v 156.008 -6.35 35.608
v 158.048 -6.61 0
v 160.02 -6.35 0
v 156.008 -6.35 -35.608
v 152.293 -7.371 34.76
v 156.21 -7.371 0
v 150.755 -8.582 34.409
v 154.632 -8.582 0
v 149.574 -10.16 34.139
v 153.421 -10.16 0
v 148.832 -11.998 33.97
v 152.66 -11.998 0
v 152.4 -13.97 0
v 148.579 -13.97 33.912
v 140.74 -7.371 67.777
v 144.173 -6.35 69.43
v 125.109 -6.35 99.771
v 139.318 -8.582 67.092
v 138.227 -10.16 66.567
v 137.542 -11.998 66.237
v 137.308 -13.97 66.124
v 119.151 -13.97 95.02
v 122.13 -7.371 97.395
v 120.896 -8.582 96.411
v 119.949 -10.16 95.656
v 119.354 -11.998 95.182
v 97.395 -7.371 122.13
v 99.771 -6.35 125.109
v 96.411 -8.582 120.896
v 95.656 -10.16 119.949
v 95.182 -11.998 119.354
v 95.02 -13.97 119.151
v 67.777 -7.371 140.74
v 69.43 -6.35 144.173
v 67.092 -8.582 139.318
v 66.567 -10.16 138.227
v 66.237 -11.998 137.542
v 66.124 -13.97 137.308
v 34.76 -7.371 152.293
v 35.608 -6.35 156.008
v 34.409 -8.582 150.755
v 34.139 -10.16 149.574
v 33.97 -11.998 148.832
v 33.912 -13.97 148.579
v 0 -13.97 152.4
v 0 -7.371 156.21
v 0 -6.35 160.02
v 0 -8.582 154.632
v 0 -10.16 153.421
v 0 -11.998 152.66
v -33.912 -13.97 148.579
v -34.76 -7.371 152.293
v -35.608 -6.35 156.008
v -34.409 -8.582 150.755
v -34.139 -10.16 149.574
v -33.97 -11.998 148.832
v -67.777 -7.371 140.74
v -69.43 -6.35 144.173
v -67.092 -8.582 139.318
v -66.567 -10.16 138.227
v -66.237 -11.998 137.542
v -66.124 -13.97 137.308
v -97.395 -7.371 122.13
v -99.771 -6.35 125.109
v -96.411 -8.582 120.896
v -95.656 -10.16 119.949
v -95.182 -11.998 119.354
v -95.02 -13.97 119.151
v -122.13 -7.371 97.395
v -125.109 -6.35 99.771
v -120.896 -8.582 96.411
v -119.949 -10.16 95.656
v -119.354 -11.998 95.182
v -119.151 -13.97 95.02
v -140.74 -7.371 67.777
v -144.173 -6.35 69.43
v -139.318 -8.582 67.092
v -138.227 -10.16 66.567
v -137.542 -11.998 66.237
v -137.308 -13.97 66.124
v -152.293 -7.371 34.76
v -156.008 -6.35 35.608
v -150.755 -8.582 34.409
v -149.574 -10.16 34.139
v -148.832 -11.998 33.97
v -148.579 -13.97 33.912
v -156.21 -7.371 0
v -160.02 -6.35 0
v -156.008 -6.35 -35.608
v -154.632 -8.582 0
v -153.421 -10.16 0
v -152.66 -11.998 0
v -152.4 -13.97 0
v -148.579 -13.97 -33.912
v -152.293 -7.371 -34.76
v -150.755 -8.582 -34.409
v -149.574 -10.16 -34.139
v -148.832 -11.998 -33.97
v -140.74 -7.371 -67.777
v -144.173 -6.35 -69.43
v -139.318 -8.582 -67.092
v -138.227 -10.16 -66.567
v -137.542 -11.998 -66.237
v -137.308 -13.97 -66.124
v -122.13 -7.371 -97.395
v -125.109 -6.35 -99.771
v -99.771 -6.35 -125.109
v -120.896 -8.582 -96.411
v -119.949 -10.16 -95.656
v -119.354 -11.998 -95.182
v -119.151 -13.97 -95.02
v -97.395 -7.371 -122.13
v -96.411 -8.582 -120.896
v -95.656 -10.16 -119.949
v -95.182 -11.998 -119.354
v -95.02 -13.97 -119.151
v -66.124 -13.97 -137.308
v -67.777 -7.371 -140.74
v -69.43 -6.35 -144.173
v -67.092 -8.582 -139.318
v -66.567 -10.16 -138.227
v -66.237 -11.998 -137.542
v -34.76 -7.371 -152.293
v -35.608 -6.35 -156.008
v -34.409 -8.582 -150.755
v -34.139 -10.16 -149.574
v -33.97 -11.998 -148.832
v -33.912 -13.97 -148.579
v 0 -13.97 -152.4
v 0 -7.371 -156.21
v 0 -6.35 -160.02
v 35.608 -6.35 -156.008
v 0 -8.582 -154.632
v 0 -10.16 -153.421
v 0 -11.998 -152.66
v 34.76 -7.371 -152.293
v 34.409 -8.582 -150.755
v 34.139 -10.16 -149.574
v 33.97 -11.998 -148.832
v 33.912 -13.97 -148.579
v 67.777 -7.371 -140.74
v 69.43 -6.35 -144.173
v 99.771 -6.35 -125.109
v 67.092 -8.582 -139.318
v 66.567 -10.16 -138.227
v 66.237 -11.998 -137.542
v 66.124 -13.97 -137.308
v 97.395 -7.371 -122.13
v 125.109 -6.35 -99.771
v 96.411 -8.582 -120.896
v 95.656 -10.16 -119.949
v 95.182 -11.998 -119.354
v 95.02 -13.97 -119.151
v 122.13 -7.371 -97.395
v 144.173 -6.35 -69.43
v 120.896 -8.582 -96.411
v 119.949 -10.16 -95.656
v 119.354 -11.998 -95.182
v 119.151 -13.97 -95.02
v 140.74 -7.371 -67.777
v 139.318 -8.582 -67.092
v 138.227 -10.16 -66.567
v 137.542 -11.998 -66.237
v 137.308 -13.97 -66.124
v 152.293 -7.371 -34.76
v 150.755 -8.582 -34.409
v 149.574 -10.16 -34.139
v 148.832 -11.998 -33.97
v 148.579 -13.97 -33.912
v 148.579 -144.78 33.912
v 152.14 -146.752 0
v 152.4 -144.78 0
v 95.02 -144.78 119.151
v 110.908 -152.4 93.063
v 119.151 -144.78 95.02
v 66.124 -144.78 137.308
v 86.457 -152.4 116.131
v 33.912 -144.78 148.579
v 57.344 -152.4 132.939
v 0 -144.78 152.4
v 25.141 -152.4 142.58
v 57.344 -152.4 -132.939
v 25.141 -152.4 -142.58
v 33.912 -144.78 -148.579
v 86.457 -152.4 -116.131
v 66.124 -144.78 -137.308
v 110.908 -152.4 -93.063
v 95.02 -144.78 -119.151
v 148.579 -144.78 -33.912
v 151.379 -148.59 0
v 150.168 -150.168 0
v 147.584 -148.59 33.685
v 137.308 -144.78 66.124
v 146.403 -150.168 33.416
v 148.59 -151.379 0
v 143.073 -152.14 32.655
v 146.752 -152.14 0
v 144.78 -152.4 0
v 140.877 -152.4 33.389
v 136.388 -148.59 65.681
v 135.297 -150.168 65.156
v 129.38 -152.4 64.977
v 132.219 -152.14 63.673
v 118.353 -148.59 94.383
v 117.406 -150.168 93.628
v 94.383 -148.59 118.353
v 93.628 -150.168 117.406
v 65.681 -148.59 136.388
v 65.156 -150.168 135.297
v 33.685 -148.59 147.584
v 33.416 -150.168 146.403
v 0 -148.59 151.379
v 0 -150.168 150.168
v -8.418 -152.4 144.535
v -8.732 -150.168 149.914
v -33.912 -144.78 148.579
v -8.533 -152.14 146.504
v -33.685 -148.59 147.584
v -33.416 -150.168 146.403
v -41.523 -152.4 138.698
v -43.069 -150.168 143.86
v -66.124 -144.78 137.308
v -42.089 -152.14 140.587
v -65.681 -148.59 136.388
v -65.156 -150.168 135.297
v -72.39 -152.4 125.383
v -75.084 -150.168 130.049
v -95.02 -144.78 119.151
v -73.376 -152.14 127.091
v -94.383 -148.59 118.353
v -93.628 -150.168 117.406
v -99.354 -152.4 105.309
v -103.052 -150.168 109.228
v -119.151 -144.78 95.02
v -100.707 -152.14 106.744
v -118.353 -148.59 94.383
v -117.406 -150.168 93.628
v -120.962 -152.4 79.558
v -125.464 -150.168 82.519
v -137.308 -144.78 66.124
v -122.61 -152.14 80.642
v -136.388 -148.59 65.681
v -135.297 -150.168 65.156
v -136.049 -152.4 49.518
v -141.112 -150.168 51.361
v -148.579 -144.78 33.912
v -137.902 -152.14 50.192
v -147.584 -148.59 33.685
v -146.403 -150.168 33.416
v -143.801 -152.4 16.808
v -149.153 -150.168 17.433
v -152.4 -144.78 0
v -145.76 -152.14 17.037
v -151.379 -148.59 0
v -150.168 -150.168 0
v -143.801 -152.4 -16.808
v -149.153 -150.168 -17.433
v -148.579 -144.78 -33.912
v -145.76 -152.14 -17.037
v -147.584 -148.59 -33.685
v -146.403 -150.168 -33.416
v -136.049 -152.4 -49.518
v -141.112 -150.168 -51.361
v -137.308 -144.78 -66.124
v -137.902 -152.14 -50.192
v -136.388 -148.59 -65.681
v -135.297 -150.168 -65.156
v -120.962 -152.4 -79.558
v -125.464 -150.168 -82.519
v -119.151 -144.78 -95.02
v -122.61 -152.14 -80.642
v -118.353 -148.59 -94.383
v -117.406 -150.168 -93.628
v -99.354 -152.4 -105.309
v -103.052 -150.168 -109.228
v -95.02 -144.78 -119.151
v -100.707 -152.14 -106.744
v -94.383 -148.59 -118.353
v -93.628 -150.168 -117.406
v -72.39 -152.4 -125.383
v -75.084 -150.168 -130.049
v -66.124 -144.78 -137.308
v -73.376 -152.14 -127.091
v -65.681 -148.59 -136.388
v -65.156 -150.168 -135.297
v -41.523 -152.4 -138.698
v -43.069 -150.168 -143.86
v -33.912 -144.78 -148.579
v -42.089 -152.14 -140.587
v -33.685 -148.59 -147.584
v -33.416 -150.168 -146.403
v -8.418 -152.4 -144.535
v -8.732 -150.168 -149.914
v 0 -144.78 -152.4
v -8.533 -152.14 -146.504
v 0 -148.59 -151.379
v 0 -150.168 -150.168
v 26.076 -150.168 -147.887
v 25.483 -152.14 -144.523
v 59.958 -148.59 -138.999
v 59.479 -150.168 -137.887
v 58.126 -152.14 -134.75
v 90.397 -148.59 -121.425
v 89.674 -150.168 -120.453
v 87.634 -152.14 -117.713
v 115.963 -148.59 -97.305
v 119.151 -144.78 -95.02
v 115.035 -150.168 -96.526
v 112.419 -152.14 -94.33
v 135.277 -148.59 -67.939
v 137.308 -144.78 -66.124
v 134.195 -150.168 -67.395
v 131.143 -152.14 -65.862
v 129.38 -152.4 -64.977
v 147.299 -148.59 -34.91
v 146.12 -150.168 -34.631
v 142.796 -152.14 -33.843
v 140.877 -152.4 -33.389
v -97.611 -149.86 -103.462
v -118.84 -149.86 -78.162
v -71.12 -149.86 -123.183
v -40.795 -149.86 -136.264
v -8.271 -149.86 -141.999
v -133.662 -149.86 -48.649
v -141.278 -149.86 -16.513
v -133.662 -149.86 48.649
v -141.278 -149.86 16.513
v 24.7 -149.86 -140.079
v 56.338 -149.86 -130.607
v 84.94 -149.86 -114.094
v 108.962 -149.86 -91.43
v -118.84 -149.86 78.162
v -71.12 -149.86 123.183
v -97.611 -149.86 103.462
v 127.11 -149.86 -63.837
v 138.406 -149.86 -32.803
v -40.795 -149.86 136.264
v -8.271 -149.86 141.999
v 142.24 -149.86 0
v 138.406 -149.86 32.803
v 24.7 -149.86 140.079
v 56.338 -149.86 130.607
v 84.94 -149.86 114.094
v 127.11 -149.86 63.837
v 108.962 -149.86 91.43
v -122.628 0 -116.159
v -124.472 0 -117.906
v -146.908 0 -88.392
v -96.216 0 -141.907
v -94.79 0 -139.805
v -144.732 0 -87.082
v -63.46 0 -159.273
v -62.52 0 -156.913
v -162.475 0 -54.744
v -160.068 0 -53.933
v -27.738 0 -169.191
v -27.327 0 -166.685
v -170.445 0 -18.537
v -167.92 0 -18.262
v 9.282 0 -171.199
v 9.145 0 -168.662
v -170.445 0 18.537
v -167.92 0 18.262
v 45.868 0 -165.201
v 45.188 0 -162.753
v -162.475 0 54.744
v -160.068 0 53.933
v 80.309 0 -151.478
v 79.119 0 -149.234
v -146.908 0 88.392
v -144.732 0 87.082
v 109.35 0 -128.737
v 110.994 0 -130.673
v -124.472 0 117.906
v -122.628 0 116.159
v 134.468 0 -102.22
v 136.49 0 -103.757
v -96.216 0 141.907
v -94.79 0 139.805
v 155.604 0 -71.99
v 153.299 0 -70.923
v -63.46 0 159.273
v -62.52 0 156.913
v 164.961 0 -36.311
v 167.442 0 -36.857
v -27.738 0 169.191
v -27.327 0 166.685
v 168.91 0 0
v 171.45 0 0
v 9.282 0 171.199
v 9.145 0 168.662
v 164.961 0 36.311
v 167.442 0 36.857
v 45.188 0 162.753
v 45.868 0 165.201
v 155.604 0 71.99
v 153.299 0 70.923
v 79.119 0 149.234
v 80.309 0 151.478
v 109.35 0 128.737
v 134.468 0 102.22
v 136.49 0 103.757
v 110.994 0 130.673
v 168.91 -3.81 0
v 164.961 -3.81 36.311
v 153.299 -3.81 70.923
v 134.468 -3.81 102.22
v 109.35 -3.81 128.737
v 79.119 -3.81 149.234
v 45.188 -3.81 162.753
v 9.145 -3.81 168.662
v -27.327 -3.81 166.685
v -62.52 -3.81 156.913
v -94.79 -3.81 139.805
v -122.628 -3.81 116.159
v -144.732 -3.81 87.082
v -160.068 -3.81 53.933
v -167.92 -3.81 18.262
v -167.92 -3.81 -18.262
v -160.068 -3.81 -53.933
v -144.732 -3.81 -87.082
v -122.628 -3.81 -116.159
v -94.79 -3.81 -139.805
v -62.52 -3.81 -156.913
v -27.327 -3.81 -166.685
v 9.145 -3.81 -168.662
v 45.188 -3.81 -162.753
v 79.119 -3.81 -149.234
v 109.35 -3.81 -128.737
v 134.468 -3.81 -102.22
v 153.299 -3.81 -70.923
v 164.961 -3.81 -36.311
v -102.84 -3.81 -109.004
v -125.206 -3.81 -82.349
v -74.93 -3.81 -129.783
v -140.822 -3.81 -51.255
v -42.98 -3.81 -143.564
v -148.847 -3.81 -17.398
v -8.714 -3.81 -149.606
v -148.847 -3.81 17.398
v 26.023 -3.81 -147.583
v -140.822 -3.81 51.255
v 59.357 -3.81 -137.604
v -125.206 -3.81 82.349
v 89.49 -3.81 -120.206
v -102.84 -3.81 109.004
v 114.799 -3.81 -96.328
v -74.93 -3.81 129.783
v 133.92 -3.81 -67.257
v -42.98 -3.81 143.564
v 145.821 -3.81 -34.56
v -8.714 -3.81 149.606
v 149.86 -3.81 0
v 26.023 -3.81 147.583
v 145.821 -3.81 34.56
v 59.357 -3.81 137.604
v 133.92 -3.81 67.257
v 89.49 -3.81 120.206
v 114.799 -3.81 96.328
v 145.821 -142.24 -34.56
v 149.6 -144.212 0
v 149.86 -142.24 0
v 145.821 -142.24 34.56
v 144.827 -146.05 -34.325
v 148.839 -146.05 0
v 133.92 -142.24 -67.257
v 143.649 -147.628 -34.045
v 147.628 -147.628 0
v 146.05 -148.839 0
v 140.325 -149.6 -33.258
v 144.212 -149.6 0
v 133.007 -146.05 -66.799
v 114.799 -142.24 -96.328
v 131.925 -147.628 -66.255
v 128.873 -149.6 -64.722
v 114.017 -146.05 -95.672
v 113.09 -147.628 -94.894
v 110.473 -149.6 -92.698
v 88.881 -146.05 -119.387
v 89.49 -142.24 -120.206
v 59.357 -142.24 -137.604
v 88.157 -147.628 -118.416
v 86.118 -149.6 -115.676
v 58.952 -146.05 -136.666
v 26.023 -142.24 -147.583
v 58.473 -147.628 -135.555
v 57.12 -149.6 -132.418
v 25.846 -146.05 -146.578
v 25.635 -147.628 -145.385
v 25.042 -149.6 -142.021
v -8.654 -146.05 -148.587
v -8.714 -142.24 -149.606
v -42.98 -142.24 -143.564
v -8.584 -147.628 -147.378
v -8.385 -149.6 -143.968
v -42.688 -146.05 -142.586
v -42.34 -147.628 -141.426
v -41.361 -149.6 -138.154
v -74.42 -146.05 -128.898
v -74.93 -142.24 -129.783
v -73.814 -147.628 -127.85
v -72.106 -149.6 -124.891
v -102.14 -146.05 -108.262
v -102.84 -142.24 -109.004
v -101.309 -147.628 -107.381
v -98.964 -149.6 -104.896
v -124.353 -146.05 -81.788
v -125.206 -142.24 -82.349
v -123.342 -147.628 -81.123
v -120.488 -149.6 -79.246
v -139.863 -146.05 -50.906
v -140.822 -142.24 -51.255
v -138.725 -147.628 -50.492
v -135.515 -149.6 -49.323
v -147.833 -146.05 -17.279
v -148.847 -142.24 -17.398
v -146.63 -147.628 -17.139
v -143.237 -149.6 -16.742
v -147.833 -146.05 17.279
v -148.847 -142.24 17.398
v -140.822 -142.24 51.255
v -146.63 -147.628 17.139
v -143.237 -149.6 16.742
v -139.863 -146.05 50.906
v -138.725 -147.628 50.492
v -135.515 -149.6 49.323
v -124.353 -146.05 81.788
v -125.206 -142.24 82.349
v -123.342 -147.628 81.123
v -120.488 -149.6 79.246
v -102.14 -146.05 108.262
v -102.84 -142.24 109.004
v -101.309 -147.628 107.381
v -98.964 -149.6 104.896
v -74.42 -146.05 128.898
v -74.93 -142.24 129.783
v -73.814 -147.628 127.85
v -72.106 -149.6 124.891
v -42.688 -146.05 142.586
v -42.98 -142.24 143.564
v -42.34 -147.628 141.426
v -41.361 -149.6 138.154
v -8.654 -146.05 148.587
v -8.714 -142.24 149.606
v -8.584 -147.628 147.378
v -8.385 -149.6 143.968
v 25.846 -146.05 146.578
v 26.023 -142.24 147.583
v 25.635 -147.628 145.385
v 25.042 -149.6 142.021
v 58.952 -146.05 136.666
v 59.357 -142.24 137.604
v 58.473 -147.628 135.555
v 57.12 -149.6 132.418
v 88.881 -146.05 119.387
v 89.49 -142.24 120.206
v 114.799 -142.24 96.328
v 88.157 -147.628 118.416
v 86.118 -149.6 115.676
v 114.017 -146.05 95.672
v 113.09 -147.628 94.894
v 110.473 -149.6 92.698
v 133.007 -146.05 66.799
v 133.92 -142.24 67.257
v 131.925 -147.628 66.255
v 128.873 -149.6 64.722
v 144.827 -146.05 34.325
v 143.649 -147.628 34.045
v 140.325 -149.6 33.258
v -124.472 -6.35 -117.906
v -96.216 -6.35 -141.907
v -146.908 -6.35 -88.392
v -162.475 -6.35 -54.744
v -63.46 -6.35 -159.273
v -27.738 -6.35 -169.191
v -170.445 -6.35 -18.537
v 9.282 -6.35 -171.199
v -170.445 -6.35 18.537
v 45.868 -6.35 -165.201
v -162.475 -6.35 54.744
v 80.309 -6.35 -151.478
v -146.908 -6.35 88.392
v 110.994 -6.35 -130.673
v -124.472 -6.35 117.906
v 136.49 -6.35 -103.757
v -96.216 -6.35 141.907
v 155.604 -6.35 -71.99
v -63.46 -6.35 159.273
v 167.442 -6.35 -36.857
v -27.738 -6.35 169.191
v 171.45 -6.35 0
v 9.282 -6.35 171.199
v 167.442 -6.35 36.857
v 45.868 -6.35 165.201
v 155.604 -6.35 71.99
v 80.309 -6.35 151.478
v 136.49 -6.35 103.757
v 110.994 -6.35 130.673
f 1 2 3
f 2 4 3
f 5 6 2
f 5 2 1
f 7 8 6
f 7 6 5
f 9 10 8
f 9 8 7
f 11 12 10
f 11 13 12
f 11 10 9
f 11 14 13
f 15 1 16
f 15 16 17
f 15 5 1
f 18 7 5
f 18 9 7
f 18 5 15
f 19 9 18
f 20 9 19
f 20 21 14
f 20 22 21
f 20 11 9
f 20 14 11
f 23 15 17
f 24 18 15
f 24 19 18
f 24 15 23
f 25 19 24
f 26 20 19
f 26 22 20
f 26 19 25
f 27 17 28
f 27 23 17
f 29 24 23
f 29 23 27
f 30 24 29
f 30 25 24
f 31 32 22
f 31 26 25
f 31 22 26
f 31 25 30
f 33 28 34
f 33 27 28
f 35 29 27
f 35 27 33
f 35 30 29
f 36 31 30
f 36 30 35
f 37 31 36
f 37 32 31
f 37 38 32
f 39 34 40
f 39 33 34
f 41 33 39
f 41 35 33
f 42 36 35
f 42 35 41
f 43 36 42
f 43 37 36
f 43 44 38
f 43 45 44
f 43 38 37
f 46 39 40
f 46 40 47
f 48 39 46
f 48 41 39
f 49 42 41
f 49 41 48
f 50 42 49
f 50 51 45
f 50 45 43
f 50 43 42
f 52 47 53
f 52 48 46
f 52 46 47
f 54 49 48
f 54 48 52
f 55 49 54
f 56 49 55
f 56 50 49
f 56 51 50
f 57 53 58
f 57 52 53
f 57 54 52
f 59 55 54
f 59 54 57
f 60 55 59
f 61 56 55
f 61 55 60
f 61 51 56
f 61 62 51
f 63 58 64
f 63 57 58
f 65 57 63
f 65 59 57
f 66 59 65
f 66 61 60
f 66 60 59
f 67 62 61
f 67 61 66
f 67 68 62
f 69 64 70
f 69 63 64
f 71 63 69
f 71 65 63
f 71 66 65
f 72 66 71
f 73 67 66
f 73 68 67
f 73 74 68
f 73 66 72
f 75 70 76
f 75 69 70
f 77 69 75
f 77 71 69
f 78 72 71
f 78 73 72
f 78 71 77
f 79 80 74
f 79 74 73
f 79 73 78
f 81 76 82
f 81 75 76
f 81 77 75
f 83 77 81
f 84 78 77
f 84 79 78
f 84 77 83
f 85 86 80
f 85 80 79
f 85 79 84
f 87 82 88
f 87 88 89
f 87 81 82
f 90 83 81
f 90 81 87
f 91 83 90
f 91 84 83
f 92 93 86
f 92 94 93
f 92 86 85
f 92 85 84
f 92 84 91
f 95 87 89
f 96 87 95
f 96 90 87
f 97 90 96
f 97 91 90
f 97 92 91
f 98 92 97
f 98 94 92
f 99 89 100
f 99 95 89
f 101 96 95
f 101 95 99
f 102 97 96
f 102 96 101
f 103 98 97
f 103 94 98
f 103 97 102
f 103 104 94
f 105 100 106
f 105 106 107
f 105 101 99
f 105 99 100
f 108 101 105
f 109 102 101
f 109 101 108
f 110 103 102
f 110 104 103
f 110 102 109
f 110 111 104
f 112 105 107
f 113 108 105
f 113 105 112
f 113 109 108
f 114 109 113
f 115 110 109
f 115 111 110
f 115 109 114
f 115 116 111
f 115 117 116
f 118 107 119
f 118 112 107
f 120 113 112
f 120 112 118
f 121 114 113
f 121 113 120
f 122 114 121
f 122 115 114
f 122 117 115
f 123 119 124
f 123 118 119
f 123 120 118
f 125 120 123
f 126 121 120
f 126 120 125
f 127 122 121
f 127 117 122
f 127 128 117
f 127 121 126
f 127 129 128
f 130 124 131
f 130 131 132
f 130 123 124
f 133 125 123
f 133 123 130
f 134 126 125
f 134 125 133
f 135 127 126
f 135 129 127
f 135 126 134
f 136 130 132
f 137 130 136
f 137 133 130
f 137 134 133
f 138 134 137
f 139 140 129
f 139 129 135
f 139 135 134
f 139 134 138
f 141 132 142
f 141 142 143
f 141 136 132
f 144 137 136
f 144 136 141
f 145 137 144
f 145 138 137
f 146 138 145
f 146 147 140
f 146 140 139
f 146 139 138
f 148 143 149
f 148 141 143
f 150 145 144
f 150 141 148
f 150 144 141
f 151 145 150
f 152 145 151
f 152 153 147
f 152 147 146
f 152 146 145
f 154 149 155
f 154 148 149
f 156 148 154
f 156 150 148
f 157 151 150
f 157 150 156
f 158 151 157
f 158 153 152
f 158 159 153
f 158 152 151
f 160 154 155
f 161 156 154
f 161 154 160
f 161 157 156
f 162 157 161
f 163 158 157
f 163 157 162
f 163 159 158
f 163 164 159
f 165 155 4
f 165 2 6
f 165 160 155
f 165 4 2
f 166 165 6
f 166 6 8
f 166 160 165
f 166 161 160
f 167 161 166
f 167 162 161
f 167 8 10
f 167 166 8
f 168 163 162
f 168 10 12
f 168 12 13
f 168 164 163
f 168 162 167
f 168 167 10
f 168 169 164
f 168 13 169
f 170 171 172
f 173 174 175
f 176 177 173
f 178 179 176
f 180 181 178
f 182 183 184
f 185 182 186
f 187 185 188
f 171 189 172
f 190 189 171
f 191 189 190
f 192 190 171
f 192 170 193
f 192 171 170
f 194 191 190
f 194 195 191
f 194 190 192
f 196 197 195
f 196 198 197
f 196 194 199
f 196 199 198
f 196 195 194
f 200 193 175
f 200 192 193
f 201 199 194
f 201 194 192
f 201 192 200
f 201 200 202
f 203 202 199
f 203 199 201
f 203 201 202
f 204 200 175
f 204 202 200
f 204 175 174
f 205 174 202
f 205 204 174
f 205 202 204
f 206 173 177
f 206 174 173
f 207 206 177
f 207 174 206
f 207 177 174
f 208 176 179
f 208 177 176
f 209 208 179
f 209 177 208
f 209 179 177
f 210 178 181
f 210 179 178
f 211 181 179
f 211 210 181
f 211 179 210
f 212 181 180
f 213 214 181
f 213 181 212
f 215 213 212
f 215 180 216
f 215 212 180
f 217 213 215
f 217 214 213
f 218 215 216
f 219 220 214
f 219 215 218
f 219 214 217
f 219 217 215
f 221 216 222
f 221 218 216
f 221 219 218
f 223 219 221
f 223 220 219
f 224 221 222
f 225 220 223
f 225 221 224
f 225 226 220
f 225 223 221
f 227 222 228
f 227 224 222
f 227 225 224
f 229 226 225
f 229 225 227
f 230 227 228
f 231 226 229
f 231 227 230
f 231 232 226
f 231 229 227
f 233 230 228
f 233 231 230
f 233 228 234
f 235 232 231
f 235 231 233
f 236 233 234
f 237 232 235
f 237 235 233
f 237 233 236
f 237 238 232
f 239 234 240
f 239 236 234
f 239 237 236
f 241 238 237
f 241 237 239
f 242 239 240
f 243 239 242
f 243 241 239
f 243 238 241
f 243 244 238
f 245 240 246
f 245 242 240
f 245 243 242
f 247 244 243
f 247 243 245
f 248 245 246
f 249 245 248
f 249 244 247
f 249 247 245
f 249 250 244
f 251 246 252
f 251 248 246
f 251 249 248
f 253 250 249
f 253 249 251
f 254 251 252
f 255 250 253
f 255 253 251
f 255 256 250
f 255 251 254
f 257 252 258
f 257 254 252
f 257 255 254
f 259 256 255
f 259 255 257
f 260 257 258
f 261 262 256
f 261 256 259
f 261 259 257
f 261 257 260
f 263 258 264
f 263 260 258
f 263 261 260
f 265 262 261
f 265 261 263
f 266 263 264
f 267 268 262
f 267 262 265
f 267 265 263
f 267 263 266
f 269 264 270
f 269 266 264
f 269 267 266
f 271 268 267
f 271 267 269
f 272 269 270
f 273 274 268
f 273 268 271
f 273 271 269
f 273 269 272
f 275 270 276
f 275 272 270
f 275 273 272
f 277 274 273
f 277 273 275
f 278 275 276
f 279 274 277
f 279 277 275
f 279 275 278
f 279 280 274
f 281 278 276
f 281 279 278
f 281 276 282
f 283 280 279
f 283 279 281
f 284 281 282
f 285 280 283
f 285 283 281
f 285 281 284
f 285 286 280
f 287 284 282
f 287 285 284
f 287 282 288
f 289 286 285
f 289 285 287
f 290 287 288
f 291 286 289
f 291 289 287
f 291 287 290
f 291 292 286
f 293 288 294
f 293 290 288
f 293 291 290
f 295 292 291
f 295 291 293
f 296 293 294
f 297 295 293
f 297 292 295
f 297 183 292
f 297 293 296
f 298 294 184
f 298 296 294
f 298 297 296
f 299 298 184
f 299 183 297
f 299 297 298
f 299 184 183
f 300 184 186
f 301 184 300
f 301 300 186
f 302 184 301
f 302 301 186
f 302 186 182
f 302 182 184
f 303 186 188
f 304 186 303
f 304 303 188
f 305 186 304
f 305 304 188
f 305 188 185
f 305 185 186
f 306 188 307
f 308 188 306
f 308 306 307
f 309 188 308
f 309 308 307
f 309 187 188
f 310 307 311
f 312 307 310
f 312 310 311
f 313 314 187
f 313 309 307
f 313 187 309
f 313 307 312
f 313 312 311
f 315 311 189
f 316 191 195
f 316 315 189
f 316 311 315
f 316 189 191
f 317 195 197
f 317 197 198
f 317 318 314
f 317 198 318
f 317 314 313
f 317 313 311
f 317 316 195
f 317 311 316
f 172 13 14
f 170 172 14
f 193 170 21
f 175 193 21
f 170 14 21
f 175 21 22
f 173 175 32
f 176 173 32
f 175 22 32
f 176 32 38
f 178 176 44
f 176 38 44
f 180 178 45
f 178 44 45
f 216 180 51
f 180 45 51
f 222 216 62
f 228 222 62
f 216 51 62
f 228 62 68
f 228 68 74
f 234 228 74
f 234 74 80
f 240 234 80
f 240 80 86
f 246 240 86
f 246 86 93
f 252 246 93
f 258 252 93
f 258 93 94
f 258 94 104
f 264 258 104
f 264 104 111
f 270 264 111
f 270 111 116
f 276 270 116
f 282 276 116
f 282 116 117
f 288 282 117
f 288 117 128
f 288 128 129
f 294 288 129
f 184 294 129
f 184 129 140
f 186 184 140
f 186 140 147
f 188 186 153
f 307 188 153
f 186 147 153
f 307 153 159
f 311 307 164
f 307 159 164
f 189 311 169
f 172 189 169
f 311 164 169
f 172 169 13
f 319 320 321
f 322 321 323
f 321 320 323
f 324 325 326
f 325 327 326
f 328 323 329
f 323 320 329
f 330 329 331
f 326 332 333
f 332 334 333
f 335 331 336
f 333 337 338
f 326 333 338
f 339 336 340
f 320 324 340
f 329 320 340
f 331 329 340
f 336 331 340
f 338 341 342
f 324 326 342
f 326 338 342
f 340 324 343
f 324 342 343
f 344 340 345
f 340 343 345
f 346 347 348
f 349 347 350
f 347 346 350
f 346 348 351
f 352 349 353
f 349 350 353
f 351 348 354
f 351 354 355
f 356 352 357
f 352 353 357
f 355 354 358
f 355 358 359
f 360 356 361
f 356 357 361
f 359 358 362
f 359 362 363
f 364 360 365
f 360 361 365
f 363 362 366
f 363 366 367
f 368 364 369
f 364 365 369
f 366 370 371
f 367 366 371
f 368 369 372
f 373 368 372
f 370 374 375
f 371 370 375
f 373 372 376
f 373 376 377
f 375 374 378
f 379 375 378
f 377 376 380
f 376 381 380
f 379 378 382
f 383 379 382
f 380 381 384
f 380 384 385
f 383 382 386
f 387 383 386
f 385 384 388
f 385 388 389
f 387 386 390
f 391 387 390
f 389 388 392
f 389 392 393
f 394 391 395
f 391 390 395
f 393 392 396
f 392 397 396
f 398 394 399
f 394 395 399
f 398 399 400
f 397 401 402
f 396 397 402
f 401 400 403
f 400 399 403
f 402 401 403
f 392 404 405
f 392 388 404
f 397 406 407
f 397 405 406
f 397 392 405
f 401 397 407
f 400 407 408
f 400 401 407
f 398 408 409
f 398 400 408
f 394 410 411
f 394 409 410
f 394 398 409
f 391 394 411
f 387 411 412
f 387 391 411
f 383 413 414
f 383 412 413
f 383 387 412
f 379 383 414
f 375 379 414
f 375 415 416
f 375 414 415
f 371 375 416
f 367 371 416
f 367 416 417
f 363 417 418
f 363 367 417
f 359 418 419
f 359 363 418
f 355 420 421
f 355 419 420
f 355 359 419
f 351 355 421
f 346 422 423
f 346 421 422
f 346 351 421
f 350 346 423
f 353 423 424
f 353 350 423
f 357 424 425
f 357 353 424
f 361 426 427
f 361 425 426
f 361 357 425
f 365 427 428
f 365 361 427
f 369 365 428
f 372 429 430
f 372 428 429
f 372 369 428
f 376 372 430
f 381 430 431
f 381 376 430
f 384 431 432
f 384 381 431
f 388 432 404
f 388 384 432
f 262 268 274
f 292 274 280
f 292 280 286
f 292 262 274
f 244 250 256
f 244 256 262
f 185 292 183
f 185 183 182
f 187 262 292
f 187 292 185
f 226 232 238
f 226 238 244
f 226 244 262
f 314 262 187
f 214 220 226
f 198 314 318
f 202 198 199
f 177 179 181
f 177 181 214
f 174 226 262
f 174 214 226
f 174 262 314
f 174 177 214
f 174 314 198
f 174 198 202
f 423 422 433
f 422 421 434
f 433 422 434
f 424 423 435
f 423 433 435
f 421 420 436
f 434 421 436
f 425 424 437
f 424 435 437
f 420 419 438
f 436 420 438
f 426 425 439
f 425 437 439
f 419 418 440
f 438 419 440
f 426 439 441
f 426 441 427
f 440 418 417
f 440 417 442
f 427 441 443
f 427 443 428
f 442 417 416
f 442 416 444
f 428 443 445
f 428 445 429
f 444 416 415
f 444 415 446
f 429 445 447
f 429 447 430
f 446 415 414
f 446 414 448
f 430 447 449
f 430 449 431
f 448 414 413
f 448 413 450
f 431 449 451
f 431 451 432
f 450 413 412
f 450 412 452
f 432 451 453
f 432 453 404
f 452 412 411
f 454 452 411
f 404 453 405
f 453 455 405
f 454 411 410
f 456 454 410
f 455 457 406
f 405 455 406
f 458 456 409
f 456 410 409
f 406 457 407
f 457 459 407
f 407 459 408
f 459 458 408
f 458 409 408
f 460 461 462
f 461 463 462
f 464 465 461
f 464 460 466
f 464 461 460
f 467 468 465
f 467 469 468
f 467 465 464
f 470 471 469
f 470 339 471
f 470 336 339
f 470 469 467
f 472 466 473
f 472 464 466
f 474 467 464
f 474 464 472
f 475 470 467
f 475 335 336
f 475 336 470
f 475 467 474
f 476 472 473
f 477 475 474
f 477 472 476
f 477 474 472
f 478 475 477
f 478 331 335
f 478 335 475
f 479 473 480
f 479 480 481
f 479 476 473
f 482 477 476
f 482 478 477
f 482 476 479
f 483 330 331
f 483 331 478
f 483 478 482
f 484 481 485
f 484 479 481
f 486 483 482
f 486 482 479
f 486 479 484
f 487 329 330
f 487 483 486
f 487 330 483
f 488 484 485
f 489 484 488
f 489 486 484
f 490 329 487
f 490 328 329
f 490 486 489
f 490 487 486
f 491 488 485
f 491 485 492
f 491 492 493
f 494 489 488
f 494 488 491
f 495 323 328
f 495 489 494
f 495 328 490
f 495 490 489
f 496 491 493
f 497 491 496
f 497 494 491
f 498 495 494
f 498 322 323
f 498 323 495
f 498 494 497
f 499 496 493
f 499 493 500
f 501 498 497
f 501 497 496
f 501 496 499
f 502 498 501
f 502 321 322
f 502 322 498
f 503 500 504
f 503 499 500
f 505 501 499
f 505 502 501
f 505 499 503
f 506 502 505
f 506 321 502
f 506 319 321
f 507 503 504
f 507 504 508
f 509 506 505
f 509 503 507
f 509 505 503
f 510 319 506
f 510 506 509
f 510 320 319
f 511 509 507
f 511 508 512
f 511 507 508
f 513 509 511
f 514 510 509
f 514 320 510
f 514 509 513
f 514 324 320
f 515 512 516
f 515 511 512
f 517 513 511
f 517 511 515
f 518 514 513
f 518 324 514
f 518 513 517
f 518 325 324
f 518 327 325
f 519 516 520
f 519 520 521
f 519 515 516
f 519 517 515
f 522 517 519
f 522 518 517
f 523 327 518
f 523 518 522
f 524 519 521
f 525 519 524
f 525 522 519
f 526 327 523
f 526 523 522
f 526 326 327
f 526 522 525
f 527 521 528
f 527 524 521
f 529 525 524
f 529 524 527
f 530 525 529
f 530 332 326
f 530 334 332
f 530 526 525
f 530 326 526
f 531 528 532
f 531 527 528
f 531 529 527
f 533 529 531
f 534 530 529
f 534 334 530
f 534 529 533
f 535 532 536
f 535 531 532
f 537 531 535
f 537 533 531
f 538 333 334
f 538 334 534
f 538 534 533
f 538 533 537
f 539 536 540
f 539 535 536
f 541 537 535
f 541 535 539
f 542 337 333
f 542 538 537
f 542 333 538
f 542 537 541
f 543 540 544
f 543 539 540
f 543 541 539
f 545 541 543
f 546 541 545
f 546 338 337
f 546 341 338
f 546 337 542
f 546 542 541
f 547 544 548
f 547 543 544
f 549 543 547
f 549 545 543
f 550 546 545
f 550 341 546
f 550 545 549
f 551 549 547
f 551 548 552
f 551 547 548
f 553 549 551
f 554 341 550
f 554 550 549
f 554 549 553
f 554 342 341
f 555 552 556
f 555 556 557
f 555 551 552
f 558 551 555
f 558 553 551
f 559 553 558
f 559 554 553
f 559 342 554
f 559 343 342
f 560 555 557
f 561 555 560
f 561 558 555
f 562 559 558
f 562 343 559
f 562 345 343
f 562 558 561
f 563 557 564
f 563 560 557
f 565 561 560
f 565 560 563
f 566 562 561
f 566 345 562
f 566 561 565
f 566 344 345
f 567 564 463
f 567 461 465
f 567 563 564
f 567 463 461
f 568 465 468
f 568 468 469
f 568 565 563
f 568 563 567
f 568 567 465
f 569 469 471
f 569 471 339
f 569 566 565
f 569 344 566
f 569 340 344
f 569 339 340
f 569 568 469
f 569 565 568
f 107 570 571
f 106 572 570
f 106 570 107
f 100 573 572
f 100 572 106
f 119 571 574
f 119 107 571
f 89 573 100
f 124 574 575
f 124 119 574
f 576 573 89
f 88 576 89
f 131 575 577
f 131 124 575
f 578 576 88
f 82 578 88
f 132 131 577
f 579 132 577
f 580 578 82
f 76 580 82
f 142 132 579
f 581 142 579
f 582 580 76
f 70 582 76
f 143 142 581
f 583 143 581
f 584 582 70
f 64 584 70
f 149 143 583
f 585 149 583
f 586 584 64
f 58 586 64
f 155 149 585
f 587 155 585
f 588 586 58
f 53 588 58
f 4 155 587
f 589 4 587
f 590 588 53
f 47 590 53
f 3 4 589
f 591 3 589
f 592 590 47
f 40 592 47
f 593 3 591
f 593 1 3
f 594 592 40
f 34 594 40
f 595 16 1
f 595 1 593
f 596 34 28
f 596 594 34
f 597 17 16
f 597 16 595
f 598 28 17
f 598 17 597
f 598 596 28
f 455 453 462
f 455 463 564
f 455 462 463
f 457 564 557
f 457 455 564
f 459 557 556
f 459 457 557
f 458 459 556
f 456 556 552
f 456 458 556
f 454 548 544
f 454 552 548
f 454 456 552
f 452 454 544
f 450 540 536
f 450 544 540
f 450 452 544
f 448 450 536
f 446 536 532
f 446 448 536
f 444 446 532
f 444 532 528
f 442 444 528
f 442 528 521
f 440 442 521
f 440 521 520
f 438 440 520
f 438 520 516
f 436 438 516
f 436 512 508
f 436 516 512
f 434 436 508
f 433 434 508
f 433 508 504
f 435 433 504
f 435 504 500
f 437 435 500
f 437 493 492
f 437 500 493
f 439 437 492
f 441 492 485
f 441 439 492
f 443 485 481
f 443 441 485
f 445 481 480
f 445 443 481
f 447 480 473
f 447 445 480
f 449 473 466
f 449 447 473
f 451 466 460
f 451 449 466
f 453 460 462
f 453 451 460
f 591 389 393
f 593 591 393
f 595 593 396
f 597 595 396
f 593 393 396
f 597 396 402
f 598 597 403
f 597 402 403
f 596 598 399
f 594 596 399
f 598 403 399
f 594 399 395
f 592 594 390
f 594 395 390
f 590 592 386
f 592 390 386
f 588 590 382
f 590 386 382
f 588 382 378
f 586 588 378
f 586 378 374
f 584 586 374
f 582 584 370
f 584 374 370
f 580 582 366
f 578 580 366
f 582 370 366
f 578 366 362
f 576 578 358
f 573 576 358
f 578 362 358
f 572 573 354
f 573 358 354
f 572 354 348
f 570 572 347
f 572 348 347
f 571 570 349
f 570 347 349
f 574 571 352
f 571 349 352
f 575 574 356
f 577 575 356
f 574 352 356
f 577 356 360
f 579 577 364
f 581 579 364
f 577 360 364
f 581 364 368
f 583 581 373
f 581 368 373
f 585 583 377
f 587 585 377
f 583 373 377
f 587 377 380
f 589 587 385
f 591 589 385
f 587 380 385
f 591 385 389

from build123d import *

# Parameters (mm, degrees)
F0_R     = 152.4
F1_DEPTH = 152.4
F0_R_2   = 171.45
F2_DEPTH = 6.35
F3_T     = -2.54
F4_R     = 7.62


with BuildPart() as f1:
    # F0 (on Front) → F1 (new body)
    with BuildSketch(Plane.XZ):
        Circle(F0_R)
    extrude(amount=F1_DEPTH)

    # F0 (on Front) → F2 (join)
    with BuildSketch(Plane.XZ):
        Circle(F0_R_2)
        Circle(F0_R, mode=Mode.SUBTRACT)
    extrude(amount=F2_DEPTH)

    # F3
    f3_openings = [f1.faces().sort_by_distance(p)[0] for p in [
        (0, 0, 0),
    ]]
    offset(amount=F3_T, openings=f3_openings, kind=Kind.INTERSECTION)

    # F4
    f4_edges = [f1.edges().sort_by_distance(p)[0] for p in [
        (-152.4, -152.4, 0),
        (-152.4, -6.35, 0),
        (-149.86, -149.86, 0),
    ]]
    fillet(f4_edges, radius=F4_R)


solid = f1.part
